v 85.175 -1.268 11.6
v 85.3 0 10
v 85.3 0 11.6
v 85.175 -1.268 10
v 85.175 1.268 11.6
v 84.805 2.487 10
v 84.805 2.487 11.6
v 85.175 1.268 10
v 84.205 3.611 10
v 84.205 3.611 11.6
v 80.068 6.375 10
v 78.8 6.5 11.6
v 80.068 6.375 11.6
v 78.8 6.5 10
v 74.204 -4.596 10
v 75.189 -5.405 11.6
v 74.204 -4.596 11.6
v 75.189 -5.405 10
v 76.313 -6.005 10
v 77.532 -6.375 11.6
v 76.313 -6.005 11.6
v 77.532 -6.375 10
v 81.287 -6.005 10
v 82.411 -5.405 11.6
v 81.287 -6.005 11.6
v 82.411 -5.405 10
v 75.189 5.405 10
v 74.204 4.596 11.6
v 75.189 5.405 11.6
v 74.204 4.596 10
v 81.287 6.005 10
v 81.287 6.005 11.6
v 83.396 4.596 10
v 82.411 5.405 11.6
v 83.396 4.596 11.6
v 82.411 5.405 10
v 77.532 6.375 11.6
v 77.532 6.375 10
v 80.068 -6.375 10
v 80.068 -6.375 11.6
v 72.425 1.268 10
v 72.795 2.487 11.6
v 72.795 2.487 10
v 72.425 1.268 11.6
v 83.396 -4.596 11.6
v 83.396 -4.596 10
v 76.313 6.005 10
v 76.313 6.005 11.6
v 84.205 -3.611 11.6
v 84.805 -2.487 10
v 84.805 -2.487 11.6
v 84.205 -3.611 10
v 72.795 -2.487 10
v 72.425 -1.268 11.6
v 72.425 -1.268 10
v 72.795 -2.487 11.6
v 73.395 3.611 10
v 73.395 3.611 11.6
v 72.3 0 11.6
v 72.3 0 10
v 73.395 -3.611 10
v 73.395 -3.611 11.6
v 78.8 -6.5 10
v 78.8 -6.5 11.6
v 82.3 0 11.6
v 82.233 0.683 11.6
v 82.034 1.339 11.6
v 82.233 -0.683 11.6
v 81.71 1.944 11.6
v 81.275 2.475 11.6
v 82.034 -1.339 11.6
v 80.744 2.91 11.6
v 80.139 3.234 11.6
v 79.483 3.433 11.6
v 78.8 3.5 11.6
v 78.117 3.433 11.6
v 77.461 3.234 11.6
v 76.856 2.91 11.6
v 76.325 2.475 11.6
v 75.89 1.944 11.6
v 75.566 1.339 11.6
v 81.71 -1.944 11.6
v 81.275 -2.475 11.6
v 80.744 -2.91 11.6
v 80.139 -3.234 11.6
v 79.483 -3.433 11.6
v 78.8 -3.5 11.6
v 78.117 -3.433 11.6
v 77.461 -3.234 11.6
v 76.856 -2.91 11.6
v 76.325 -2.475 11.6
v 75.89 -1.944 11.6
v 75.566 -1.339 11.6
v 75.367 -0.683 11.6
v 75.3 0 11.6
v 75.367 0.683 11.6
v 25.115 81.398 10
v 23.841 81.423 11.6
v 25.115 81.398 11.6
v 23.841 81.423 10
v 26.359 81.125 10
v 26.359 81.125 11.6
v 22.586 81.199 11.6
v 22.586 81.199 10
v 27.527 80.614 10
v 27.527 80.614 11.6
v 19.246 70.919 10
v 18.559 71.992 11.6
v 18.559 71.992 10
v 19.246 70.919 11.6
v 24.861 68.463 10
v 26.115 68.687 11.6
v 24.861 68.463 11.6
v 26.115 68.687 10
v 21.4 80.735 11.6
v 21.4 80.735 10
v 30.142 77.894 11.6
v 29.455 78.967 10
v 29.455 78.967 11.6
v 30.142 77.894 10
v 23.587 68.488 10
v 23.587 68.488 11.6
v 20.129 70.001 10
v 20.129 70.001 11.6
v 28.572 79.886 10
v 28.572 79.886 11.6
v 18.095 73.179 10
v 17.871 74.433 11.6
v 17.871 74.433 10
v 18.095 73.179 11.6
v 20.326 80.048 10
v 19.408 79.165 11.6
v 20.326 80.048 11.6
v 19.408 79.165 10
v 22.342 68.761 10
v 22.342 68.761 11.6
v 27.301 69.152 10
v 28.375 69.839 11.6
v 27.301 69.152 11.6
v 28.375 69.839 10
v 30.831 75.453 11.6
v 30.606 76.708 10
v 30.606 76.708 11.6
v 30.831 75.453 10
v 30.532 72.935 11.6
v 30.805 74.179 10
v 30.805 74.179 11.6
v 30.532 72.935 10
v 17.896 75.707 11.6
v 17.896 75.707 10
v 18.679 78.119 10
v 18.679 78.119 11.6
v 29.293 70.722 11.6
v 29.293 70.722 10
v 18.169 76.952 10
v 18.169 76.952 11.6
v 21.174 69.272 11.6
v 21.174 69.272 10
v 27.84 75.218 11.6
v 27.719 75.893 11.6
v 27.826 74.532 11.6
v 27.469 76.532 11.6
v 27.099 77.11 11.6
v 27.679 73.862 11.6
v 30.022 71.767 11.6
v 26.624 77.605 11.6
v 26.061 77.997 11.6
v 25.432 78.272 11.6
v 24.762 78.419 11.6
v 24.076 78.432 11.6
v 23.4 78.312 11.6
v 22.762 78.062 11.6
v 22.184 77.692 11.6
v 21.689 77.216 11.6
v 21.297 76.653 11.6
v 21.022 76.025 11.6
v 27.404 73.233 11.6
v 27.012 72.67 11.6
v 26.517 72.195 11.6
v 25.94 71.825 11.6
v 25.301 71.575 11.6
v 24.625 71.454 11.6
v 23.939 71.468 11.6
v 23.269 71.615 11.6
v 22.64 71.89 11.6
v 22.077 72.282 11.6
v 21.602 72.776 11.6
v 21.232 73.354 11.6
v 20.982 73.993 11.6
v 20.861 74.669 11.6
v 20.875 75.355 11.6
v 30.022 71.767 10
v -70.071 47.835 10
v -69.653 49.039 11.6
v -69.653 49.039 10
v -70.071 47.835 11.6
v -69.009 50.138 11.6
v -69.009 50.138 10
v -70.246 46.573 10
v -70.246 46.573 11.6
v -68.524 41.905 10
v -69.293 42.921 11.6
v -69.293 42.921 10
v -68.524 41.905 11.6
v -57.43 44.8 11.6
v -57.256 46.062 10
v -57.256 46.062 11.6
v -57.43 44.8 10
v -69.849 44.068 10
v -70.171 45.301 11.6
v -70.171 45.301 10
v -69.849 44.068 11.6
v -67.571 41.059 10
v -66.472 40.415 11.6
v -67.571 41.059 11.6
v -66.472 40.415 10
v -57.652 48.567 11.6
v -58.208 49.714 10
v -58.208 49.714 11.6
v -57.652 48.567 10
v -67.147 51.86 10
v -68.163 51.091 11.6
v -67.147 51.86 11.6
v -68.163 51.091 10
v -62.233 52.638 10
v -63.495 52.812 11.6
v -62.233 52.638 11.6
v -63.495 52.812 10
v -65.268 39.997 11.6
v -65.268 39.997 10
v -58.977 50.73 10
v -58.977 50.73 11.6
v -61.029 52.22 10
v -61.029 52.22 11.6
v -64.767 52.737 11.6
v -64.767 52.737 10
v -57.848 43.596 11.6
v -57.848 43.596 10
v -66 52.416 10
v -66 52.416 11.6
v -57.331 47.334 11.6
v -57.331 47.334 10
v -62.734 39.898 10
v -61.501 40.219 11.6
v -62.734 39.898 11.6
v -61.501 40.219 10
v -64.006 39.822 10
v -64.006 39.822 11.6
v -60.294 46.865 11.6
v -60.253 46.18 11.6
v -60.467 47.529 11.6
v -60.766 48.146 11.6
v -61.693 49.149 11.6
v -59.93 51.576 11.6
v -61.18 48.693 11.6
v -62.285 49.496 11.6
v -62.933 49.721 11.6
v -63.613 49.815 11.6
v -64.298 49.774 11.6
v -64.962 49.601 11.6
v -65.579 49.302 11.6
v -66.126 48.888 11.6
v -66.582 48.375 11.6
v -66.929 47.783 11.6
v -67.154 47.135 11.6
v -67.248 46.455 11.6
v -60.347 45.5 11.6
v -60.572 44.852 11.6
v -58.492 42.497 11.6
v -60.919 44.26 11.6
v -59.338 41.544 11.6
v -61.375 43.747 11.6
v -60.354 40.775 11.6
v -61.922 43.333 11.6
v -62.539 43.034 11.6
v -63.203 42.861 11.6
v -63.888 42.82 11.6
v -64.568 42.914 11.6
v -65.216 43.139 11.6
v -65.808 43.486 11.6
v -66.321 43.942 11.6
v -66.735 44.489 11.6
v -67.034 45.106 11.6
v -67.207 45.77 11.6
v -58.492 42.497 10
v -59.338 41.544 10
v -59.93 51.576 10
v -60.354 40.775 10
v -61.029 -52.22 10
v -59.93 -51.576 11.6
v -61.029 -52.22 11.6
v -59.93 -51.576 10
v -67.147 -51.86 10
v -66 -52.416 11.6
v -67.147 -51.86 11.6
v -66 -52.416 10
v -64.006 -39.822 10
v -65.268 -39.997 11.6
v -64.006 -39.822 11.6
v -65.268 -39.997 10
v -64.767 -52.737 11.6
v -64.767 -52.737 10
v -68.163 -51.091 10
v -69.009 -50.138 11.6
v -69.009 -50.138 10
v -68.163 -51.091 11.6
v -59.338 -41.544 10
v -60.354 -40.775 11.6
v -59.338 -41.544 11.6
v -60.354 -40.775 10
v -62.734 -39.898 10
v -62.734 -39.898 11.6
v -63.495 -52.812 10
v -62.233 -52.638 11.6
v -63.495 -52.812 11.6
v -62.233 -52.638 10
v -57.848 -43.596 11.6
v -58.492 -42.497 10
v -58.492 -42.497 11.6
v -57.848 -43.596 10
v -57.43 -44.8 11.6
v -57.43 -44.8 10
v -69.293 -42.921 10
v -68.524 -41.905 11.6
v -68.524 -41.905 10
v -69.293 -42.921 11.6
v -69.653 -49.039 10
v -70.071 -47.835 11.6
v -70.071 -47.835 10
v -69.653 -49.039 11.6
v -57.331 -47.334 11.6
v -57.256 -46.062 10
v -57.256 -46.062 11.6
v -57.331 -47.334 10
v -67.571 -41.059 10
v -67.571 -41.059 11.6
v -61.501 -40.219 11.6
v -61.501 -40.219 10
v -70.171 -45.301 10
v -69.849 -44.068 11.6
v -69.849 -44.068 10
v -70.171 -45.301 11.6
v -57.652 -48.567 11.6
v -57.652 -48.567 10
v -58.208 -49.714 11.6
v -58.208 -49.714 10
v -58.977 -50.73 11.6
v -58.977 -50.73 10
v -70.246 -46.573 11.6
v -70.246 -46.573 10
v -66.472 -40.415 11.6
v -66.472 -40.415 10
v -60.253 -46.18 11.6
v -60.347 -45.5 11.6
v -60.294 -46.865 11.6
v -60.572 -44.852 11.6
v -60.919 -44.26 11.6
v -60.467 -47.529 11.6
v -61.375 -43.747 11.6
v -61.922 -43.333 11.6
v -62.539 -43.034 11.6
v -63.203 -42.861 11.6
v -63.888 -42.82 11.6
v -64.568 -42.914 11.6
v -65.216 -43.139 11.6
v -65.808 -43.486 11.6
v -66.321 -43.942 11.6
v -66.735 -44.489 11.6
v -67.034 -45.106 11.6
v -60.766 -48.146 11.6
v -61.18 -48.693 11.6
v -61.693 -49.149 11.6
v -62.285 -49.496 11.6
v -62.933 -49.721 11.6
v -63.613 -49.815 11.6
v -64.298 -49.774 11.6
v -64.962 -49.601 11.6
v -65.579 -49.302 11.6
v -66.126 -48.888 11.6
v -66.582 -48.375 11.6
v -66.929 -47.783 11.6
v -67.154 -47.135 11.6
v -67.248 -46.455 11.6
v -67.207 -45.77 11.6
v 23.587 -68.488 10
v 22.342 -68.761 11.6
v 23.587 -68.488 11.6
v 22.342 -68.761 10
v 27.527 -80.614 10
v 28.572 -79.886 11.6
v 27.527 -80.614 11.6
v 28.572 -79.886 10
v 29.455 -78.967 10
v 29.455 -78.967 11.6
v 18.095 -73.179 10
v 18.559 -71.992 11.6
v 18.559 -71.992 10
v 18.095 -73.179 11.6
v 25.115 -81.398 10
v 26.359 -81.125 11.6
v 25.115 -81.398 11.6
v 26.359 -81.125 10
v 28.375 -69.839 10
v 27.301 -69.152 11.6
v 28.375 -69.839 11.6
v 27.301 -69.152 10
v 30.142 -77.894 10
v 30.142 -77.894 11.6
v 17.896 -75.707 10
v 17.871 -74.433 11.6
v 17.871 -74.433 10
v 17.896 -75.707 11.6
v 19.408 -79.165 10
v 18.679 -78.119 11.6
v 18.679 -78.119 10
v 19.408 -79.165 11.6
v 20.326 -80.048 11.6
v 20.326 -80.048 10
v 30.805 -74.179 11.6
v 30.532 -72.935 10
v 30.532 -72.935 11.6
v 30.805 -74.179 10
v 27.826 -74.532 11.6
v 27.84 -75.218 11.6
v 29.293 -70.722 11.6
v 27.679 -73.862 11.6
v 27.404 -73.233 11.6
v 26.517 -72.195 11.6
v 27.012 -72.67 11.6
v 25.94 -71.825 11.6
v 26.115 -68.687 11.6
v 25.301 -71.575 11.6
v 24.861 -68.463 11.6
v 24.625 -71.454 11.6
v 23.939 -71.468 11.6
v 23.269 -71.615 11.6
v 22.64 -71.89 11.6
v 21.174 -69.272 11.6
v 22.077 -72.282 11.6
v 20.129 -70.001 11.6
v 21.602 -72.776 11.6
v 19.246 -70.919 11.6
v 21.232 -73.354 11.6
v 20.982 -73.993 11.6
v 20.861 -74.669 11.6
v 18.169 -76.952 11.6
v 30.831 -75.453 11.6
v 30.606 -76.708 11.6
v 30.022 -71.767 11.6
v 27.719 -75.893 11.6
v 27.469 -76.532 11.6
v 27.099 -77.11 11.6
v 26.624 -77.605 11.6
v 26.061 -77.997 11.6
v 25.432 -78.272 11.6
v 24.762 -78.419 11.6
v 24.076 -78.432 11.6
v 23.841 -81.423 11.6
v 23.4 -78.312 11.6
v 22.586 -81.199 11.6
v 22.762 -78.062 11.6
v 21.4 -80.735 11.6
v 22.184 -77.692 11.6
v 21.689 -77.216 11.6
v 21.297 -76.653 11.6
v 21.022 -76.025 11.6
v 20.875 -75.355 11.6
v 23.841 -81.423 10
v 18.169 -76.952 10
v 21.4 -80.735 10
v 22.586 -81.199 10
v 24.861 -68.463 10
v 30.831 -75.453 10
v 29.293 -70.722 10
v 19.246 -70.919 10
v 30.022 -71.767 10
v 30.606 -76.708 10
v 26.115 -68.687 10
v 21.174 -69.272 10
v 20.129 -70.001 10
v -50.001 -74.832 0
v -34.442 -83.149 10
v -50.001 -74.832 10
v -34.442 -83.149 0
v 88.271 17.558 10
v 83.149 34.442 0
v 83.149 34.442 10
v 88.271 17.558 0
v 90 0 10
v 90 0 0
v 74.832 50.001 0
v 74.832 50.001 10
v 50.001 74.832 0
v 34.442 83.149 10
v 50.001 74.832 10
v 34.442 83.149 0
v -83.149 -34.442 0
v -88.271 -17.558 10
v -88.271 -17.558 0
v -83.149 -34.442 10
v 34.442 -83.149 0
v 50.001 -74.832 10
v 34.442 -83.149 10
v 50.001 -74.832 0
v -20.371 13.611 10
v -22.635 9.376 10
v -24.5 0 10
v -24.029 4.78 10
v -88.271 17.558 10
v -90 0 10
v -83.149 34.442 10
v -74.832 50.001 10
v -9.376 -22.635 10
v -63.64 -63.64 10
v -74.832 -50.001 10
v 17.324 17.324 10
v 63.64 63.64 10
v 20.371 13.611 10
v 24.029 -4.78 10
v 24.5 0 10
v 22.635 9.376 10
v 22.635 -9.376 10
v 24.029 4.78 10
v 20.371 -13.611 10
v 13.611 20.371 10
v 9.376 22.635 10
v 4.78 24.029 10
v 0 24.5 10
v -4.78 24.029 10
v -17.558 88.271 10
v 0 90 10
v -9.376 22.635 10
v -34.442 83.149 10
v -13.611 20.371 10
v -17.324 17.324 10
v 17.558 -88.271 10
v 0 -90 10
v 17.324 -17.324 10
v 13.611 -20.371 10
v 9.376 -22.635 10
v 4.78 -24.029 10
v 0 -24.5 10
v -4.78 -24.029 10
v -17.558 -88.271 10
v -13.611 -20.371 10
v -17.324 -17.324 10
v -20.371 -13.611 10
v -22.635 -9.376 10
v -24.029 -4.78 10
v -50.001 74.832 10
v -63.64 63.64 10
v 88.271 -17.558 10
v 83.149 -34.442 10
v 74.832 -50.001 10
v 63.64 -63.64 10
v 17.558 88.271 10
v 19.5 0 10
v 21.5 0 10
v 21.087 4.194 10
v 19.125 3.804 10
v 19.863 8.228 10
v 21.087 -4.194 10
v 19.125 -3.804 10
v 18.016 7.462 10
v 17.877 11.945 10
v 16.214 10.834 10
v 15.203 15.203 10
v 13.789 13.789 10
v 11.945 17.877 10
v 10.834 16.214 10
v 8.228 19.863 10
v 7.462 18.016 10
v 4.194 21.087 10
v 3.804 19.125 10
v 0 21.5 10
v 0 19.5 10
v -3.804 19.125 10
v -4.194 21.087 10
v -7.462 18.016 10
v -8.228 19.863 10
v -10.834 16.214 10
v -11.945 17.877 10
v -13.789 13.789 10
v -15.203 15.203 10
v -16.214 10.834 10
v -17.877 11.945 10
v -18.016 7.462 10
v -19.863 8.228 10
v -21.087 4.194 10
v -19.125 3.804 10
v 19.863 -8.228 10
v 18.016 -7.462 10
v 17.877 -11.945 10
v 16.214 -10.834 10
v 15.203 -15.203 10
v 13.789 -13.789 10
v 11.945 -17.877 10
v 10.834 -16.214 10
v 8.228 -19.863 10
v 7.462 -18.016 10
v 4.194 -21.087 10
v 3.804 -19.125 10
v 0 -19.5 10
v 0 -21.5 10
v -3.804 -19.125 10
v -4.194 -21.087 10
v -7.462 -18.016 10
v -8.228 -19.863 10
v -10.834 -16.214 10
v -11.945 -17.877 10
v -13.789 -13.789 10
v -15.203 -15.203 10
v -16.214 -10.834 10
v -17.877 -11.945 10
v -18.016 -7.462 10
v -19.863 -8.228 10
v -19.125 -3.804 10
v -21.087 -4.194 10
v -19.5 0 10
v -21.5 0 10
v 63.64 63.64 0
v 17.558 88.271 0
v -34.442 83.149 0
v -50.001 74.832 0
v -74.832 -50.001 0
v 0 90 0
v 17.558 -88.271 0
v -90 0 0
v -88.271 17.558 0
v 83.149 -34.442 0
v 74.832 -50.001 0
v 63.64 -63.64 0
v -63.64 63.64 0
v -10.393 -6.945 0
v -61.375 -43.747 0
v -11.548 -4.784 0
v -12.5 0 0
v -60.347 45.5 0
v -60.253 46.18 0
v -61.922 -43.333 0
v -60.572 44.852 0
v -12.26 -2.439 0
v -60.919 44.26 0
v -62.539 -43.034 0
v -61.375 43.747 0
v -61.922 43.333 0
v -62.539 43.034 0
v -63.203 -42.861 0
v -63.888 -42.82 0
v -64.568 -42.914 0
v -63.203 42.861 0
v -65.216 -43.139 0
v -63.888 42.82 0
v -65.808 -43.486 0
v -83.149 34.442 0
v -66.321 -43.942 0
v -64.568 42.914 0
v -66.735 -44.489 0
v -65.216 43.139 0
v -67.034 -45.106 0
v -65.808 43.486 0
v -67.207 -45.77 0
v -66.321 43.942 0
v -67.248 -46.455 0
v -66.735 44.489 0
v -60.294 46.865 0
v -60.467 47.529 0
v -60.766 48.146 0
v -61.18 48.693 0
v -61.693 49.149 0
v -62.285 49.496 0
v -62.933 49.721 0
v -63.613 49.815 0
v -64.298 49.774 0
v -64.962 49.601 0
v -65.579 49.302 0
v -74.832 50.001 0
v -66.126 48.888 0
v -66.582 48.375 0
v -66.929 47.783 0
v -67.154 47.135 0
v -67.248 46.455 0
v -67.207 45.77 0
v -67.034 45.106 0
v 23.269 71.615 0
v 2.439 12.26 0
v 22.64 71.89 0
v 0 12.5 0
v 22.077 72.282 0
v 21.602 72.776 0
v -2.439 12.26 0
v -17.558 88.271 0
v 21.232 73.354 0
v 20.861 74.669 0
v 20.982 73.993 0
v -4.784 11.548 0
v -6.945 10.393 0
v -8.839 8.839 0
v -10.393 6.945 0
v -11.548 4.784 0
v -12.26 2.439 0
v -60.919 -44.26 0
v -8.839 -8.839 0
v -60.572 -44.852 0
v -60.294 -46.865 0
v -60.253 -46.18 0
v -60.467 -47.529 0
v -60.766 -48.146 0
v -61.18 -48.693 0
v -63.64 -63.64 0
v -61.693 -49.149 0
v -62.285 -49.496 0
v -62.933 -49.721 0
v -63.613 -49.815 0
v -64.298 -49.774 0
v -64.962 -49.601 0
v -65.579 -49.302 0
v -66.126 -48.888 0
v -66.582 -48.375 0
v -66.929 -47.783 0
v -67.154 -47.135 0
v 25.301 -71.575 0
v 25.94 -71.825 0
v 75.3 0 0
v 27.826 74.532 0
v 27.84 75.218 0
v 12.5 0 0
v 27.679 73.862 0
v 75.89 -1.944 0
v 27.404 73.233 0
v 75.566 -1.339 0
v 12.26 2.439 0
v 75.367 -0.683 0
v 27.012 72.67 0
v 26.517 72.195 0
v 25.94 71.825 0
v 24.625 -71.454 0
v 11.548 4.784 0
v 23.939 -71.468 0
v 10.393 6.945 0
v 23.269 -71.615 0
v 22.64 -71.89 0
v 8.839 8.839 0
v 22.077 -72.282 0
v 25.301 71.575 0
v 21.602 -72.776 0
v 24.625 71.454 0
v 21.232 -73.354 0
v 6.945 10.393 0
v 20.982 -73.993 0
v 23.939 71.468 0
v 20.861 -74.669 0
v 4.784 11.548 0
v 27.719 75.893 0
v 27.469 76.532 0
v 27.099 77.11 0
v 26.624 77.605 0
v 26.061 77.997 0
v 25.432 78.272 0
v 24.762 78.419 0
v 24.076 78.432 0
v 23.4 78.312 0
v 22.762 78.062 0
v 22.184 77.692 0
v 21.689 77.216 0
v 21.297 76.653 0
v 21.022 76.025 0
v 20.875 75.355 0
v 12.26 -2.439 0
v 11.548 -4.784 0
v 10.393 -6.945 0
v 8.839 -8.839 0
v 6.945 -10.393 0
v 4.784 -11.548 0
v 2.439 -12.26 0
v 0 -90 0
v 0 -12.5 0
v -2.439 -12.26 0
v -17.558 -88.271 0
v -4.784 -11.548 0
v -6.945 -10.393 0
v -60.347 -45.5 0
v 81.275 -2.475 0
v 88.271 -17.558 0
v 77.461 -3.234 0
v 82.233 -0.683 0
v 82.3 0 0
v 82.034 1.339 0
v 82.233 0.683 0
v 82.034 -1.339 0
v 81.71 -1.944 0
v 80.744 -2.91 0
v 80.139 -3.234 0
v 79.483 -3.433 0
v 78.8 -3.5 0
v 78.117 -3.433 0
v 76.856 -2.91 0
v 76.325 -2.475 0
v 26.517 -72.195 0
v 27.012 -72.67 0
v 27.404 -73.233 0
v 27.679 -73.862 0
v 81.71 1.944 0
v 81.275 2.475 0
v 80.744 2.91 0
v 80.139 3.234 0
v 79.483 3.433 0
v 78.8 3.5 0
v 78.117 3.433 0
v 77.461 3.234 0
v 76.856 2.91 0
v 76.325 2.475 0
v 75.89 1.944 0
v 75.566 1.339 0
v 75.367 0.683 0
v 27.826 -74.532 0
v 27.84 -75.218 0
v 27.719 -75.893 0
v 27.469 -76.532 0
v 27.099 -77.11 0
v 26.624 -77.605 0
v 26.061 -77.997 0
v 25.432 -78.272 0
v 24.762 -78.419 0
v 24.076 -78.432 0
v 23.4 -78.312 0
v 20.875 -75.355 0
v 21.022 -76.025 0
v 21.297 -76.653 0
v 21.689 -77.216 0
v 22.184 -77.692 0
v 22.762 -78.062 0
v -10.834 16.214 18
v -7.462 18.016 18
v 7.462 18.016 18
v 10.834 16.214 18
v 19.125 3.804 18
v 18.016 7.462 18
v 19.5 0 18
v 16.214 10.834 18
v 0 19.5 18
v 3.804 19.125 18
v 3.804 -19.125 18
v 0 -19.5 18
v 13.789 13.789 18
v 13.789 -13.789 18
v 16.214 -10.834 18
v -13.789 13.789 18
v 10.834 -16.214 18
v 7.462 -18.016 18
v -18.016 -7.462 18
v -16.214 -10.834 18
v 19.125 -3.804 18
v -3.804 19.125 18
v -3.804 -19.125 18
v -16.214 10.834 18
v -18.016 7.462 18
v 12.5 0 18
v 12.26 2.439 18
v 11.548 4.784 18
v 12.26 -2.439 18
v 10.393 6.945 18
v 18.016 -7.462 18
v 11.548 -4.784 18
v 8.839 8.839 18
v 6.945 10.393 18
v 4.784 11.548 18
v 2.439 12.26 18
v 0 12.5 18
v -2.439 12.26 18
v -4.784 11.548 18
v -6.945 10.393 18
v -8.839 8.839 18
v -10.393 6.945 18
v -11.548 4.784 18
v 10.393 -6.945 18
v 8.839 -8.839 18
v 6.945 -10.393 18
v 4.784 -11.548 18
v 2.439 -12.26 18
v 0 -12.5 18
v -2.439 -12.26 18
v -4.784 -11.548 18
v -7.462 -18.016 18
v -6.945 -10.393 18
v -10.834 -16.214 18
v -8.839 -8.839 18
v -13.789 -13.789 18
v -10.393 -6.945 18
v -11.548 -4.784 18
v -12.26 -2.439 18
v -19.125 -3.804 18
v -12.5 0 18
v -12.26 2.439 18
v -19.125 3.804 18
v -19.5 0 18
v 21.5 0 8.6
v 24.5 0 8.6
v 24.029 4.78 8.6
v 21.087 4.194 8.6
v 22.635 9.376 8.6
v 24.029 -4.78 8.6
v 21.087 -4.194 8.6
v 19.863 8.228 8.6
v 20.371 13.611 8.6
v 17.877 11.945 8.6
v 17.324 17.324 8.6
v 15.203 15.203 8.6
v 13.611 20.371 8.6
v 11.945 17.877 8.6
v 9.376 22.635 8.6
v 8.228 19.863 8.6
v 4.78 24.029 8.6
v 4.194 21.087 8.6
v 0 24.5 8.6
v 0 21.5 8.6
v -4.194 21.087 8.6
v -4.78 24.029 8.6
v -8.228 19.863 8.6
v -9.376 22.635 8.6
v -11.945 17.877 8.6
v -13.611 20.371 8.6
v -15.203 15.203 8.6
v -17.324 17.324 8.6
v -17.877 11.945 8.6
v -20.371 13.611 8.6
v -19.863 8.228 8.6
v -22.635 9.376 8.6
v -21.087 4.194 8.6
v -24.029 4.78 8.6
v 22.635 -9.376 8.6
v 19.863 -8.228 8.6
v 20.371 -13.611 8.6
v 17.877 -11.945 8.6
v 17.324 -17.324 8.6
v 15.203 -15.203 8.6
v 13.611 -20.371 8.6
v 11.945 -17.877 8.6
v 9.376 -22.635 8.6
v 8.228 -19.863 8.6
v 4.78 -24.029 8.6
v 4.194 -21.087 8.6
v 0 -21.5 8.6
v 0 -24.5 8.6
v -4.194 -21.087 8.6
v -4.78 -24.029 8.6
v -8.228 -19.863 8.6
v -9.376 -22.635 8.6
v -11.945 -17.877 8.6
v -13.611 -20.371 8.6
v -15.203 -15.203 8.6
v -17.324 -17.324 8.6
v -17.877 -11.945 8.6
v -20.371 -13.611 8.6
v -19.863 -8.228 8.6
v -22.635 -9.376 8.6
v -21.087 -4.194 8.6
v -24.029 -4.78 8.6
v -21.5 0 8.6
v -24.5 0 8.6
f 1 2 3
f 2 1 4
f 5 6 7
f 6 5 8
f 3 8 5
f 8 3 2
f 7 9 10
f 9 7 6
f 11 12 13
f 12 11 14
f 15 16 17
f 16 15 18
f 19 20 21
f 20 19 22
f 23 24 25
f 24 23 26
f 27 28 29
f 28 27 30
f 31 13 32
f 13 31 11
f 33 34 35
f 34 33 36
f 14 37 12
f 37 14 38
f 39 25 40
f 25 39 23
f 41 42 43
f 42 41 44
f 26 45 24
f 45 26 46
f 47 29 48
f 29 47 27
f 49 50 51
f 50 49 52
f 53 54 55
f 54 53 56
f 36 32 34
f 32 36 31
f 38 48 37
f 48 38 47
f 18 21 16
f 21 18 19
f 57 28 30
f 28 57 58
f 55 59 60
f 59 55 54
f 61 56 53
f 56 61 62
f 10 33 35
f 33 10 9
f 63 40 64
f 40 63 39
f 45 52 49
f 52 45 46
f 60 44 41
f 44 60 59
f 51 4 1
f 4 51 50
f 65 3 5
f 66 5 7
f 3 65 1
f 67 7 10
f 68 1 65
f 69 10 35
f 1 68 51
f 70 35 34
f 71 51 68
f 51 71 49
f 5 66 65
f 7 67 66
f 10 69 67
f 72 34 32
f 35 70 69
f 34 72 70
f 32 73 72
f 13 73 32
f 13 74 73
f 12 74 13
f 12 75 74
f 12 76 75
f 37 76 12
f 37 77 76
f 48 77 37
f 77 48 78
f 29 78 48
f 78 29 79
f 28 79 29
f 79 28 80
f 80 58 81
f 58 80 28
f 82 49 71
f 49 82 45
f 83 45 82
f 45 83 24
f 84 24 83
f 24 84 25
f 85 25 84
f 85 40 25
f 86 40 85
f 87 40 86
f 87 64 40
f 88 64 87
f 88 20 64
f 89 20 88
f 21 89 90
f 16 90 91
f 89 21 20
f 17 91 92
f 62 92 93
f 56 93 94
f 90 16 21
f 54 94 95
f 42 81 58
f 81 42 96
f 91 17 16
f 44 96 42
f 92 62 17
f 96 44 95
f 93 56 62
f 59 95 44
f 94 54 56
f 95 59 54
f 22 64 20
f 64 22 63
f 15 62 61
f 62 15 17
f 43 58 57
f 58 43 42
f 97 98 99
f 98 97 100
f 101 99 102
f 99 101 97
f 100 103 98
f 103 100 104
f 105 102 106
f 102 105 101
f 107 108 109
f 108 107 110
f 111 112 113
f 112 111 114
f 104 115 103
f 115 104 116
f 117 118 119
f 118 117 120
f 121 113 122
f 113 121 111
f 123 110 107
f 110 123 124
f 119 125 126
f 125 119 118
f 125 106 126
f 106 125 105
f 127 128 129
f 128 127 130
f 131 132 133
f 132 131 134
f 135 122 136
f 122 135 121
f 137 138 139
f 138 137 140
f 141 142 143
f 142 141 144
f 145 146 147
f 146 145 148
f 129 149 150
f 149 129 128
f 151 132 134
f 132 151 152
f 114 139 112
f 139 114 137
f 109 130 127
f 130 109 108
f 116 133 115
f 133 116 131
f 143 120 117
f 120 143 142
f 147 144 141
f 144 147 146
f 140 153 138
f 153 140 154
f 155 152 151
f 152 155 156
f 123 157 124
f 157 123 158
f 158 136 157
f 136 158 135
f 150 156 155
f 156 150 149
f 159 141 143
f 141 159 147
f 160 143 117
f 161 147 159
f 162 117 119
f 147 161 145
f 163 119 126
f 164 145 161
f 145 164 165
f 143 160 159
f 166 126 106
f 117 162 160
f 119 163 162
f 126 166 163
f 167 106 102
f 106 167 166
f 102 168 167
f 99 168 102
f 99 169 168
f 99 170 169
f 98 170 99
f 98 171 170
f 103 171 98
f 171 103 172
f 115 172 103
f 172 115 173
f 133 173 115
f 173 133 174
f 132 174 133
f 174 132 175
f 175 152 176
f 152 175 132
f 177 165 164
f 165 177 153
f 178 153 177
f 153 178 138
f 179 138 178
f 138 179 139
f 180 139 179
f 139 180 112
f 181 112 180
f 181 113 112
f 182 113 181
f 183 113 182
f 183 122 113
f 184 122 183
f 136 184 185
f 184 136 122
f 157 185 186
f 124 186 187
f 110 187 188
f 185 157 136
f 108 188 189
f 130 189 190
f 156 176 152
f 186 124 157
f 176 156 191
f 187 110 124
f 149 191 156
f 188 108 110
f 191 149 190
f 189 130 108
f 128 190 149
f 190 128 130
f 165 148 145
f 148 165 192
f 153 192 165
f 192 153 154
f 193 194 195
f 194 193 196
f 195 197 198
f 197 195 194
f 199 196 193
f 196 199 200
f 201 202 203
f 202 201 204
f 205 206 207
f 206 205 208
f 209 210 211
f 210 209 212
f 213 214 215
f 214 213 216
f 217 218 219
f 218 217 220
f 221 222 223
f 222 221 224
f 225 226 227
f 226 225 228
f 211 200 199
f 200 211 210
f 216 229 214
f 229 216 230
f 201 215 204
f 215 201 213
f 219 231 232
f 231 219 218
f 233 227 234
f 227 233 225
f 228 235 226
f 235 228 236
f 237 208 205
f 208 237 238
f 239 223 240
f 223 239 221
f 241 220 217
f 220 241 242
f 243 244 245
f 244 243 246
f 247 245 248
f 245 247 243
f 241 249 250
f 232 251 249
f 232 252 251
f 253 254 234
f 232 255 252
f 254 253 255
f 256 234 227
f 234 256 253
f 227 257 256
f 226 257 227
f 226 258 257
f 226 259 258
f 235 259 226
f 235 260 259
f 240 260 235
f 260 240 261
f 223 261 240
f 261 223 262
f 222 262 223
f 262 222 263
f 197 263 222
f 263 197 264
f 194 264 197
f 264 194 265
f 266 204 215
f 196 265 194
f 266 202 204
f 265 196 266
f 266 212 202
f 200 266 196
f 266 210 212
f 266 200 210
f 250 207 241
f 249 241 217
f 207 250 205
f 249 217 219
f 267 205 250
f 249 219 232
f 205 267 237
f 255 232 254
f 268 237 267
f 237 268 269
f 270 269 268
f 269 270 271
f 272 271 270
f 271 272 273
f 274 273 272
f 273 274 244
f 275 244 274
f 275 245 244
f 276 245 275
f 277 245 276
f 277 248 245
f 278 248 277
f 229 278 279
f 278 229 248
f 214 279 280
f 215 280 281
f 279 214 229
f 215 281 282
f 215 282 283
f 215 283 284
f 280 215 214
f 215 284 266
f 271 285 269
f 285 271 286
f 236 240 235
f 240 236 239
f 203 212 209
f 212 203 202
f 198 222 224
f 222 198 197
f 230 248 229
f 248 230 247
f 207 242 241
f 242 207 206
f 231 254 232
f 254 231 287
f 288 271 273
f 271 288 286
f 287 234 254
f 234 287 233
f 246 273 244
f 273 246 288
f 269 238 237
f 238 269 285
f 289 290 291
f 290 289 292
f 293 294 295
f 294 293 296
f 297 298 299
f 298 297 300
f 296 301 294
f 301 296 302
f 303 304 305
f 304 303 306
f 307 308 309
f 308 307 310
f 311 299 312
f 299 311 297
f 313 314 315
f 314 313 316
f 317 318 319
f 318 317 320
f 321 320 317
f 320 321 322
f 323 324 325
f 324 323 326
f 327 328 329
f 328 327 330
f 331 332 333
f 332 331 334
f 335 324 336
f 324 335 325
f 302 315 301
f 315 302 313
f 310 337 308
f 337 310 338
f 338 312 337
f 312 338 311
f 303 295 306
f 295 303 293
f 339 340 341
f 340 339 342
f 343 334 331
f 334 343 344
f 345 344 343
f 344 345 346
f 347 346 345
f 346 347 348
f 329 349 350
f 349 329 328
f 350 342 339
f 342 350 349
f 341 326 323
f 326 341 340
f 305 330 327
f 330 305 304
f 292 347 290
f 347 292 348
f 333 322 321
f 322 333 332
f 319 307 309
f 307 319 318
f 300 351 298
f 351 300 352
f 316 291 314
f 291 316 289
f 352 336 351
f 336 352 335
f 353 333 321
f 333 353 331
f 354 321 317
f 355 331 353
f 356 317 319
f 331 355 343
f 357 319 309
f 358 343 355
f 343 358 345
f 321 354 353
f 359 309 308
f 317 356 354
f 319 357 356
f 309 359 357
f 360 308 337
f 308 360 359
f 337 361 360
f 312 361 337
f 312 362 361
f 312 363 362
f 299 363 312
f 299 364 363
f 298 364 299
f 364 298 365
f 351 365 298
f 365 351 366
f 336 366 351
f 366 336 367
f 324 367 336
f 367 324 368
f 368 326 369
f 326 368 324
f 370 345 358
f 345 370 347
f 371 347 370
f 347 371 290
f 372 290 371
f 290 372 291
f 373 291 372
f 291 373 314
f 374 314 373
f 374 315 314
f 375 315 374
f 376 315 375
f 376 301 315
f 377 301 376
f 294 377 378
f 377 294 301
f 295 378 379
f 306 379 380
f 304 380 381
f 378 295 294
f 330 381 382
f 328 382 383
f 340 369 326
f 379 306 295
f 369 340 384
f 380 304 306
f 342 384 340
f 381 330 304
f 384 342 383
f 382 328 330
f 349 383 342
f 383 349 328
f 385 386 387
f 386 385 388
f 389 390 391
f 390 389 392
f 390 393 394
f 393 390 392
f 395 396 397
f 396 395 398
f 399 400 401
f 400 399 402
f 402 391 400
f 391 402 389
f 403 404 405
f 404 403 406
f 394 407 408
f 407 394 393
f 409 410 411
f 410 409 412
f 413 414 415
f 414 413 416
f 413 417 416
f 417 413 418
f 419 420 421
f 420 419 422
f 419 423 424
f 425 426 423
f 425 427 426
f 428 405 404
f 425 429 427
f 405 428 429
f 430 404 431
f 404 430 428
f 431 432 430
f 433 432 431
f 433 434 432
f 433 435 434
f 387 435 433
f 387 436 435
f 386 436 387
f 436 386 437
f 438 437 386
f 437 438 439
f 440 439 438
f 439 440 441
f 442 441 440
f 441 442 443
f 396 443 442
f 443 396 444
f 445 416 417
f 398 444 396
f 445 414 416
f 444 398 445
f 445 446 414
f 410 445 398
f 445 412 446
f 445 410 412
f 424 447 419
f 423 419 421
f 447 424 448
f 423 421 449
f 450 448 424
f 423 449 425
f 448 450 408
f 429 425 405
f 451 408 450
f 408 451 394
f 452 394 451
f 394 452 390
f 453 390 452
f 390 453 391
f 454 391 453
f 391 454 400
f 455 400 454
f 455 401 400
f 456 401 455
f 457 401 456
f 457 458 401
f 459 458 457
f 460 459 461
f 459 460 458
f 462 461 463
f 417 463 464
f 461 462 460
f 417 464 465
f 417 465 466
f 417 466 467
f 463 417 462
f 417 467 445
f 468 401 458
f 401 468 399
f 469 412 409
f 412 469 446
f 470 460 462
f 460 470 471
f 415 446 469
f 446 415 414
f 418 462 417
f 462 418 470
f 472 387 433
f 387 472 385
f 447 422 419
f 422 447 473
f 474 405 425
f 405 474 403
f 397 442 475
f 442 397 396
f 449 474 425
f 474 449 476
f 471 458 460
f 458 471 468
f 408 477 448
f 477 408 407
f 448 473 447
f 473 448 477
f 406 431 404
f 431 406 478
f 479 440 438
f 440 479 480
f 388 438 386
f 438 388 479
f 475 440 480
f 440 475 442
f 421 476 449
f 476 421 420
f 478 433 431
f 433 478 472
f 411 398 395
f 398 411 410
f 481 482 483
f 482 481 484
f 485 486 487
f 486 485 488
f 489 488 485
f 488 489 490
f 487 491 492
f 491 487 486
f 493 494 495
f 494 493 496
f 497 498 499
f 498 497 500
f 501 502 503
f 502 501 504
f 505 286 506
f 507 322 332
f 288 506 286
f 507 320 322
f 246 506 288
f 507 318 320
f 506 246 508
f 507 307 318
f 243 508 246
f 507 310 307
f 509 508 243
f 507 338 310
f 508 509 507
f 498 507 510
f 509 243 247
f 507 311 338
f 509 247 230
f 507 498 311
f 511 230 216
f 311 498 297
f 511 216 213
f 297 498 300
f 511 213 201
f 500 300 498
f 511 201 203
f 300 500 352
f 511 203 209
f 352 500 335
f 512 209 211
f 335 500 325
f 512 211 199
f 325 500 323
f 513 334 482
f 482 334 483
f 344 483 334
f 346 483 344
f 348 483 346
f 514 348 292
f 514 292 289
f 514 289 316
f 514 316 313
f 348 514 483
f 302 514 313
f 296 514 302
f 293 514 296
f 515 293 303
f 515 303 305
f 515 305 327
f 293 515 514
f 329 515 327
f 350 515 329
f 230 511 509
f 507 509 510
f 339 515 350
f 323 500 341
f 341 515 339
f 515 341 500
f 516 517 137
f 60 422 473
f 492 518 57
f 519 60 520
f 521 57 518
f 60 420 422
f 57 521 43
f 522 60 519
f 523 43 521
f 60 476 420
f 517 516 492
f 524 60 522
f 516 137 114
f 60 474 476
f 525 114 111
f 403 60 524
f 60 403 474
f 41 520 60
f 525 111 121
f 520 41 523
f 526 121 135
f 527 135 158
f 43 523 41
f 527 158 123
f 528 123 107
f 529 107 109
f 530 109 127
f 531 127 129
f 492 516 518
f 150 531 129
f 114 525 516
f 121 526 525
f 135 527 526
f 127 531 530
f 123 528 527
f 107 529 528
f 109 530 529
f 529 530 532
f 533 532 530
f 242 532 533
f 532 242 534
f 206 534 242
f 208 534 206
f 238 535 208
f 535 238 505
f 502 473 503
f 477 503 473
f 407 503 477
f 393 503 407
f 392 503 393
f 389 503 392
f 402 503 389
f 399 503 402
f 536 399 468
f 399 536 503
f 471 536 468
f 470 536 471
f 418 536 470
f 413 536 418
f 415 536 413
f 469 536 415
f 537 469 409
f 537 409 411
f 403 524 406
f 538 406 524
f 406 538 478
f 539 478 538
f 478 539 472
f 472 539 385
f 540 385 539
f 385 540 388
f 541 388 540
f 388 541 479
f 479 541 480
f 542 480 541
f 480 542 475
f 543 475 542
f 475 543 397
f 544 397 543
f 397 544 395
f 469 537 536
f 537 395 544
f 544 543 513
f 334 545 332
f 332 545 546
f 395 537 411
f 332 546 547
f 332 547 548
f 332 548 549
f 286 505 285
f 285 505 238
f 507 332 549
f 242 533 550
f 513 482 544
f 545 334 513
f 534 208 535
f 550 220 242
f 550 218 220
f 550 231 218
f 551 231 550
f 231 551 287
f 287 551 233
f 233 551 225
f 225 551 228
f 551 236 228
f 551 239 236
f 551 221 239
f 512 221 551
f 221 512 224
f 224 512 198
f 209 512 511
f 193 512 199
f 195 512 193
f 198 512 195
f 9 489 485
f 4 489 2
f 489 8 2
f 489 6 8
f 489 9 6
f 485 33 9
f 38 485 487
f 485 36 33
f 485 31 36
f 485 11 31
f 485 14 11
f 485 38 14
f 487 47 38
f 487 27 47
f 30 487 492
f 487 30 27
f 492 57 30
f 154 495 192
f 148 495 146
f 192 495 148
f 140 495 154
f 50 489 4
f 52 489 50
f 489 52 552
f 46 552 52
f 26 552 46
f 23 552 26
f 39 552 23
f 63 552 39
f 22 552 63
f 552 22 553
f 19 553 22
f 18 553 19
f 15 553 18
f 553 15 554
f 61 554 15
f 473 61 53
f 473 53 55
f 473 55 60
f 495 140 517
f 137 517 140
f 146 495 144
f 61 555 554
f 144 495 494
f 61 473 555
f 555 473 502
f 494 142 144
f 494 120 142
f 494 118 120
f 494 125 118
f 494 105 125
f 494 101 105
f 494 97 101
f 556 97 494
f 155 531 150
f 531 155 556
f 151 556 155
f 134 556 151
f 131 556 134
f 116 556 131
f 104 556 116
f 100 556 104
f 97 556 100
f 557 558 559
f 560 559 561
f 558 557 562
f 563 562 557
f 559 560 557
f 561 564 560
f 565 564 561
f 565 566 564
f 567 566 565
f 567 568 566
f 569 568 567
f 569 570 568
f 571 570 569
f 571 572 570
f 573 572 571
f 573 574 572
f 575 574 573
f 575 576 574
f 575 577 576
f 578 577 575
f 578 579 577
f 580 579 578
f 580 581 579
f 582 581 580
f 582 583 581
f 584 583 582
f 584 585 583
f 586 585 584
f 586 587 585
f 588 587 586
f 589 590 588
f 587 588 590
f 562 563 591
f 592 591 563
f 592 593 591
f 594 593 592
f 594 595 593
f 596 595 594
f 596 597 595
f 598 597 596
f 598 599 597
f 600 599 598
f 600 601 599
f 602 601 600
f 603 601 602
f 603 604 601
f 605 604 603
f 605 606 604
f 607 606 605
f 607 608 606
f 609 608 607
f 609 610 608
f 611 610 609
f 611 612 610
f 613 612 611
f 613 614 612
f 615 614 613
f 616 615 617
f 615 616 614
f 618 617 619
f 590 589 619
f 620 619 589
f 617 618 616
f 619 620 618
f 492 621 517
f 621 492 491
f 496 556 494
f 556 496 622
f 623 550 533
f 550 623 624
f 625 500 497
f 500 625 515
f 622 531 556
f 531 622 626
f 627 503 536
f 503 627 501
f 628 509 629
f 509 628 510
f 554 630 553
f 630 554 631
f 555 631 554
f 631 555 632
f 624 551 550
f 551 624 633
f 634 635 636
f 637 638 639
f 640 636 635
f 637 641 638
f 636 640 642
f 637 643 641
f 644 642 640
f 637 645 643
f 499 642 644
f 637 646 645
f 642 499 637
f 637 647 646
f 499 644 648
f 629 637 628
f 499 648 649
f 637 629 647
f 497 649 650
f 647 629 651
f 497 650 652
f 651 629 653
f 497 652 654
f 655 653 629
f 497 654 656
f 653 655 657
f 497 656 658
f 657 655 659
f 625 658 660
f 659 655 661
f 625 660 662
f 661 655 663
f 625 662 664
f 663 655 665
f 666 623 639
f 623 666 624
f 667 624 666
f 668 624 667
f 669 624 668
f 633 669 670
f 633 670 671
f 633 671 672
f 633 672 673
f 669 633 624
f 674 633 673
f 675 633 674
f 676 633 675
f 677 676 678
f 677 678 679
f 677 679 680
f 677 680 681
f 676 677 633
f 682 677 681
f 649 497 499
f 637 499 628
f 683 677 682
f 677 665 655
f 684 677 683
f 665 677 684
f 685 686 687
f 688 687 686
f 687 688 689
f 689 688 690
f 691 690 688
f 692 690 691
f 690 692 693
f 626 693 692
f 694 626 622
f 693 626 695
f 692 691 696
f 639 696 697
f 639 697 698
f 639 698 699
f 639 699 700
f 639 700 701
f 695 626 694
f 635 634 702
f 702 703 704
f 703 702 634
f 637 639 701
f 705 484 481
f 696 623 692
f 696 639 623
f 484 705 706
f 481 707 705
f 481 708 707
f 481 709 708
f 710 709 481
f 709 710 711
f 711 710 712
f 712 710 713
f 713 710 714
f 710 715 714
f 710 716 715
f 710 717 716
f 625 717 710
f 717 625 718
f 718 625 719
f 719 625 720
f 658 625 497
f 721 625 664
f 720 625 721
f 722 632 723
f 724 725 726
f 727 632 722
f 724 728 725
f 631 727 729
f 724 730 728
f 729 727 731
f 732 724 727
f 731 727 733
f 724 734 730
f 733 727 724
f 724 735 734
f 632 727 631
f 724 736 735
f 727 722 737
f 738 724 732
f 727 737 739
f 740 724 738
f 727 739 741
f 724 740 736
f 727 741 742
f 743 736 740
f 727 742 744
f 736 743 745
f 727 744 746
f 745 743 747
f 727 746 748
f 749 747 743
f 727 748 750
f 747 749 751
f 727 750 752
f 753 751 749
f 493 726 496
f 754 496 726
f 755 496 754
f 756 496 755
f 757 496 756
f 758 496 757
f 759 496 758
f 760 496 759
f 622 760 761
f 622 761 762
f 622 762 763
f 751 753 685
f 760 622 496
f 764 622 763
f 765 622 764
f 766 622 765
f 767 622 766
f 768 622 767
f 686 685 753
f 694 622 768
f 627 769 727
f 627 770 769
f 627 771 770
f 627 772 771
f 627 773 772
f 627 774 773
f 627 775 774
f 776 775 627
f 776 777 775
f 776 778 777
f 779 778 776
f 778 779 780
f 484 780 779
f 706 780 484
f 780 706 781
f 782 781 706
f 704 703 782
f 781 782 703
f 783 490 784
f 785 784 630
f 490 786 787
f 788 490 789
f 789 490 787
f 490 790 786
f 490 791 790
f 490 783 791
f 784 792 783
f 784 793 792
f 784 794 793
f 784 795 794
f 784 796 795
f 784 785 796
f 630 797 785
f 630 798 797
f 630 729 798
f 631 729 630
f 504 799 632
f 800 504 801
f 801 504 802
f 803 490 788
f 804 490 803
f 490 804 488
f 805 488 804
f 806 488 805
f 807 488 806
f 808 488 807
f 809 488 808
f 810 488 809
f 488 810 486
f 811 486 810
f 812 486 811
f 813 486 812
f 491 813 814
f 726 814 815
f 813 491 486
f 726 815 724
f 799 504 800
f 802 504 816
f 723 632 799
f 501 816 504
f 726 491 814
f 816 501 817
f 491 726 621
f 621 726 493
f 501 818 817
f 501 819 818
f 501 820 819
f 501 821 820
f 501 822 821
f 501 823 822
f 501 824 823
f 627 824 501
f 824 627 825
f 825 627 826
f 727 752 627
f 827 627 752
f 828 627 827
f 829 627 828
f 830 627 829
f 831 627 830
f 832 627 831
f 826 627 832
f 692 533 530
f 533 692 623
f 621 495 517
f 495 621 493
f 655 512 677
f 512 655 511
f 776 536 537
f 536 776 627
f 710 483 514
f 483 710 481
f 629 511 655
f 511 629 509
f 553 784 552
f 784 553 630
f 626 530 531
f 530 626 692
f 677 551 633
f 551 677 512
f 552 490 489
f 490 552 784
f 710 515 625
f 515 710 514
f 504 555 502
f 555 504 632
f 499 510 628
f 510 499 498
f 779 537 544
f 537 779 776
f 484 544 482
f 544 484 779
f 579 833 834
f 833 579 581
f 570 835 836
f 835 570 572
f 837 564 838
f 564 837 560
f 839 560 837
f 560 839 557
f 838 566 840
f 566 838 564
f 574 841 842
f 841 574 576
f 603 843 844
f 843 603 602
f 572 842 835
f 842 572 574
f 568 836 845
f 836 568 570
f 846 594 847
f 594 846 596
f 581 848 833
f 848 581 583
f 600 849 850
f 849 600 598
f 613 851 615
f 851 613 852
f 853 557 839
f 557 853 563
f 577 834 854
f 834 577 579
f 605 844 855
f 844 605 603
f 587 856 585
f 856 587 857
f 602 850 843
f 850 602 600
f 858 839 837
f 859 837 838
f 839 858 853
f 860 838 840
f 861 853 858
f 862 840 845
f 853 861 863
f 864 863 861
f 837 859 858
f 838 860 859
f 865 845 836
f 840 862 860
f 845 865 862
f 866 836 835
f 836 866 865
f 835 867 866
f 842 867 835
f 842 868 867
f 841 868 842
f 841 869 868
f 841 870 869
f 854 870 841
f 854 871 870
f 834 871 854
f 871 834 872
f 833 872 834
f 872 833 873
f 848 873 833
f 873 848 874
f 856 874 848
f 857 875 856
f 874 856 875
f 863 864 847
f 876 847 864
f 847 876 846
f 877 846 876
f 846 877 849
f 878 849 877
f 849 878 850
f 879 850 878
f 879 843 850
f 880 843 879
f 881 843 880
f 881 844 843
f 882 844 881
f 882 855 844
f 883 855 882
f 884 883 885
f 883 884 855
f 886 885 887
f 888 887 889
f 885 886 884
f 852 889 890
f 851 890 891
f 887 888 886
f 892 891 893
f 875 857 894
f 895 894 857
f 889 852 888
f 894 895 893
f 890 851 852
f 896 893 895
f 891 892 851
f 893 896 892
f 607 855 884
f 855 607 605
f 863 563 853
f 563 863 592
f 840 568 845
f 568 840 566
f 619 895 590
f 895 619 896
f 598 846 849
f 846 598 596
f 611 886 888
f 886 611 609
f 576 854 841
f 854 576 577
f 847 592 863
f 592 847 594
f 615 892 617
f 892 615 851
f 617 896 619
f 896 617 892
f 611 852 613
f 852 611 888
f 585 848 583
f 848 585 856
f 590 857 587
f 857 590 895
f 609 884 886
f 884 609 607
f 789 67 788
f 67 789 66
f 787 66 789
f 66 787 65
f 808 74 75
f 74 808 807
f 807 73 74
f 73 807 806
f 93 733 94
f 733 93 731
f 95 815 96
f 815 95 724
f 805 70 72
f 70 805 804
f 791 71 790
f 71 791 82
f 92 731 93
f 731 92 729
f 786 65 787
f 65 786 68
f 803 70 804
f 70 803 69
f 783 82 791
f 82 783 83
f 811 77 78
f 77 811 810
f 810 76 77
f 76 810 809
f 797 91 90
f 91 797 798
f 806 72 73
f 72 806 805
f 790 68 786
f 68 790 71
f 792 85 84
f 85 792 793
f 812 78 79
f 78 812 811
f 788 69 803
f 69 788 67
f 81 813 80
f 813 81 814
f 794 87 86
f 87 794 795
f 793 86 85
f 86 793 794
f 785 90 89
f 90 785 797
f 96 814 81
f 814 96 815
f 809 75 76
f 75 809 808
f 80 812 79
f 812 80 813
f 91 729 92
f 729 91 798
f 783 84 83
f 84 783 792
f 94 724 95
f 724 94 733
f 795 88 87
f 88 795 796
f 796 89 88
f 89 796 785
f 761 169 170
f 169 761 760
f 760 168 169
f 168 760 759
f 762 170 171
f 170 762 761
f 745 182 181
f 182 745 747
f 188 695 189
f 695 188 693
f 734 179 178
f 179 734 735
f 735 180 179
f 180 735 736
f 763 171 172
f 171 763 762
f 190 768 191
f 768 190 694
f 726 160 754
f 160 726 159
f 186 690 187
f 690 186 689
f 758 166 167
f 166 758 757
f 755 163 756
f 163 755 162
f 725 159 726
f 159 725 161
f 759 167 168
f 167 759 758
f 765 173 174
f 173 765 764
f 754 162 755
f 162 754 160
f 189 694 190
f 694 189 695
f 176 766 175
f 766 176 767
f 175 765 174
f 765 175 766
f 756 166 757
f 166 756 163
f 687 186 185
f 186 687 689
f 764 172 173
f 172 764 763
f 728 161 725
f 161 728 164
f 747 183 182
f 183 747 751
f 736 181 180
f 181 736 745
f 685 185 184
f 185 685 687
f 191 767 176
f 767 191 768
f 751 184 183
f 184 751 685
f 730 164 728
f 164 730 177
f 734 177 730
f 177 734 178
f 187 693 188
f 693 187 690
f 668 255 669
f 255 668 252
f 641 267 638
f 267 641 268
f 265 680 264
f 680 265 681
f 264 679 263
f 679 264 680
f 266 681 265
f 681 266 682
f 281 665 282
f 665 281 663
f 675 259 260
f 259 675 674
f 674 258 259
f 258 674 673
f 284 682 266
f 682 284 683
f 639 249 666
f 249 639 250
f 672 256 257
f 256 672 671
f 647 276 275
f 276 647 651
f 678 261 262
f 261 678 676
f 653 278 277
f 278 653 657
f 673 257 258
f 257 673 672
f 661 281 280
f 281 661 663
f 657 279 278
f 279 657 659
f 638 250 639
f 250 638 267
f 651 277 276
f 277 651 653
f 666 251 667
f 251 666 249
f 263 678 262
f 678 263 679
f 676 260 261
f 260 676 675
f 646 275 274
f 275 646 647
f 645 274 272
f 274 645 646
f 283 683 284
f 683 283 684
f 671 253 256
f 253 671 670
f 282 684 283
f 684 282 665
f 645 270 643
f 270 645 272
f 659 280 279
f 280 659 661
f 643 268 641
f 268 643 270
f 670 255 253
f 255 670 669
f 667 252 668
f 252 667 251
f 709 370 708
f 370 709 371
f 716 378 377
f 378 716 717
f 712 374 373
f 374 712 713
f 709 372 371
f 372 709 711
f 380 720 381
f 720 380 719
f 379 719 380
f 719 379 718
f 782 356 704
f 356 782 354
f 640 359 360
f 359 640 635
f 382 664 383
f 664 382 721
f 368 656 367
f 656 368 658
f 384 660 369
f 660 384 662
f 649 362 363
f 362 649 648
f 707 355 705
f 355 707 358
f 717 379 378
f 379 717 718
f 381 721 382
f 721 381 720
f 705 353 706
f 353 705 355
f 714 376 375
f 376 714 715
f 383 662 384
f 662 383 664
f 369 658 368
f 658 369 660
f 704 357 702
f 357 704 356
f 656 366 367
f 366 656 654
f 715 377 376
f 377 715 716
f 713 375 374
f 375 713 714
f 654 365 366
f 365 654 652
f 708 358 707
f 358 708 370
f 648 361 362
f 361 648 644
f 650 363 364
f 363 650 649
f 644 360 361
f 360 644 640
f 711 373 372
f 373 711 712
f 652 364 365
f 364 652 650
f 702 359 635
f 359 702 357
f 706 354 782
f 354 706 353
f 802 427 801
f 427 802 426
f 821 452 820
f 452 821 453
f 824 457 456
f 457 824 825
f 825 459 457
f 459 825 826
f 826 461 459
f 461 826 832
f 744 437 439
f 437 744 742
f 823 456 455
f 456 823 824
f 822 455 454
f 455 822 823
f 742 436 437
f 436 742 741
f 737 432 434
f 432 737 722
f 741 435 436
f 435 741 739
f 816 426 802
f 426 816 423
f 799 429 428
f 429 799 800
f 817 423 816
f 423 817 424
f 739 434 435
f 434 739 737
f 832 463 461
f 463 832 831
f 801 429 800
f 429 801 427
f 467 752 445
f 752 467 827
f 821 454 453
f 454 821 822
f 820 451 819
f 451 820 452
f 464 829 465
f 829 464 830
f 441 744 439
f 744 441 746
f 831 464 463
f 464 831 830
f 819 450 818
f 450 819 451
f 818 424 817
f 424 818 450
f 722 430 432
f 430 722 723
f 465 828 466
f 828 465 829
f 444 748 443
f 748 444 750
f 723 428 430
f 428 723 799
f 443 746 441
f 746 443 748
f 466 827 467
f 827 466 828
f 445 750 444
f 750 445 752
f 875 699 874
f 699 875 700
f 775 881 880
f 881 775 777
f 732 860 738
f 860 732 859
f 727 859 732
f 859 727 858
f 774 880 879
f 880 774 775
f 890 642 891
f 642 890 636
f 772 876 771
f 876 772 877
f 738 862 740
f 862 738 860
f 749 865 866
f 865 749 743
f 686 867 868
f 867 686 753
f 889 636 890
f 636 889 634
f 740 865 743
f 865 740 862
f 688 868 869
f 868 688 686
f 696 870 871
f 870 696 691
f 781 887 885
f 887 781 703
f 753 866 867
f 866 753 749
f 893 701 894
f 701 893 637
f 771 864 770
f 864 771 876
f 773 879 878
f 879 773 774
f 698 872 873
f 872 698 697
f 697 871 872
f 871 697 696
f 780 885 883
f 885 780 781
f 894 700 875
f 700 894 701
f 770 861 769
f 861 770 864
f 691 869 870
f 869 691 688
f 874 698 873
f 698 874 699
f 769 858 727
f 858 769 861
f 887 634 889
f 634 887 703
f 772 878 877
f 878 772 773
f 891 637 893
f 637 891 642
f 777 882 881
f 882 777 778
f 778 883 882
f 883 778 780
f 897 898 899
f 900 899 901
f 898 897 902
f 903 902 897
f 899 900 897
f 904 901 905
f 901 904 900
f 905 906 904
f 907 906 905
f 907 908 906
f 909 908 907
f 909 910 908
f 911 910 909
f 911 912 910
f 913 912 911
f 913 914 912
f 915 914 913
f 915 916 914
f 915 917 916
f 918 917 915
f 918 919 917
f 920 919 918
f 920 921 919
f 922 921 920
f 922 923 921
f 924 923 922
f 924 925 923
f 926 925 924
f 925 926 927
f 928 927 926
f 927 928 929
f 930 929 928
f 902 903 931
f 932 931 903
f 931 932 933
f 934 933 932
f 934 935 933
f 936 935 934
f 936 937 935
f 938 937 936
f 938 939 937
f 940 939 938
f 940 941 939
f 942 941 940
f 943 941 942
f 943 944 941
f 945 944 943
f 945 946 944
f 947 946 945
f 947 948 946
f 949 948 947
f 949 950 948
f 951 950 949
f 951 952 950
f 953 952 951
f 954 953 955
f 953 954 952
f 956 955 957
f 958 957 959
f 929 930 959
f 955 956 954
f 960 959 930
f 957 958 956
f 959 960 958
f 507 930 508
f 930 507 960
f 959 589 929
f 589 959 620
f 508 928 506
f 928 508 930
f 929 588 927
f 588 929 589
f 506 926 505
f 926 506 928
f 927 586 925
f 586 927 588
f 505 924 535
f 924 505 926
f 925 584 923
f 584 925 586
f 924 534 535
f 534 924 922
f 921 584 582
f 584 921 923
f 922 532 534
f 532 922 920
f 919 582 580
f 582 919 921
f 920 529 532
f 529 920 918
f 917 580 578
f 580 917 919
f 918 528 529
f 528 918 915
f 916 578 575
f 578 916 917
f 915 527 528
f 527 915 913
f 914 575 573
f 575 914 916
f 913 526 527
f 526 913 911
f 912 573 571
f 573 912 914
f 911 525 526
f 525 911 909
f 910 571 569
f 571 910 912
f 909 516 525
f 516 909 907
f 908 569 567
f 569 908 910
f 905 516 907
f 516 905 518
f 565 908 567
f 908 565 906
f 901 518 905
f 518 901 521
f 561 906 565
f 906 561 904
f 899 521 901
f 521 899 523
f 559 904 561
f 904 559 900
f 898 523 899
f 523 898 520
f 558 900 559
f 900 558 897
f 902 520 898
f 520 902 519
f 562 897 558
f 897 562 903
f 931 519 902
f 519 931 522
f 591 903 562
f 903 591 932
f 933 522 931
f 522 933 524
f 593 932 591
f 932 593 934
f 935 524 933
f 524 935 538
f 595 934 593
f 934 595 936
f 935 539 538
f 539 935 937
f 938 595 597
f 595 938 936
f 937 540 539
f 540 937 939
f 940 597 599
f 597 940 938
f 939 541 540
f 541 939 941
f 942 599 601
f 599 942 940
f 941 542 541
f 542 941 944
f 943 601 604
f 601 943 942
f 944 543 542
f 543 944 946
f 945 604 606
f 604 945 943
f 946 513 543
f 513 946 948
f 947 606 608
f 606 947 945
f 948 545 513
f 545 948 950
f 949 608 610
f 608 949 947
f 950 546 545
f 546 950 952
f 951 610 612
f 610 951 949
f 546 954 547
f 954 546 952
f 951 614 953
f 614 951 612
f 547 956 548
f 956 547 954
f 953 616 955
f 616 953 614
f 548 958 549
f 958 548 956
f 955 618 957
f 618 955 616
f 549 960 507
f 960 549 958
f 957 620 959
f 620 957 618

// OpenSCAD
$fn = 32;

// ----------------------------------------------------------------------
// Bolt-circle flange: 180 mm outside, 5 bolt holes, bore 25 mm
// ----------------------------------------------------------------------

// --- parameters (mm) ---
flange_d = 180;           // flange outside diameter
flange_t = 10;            // flange thickness
bolts = 5;                // number of bolt holes
bolt_d = 7;               // bolt clearance
bolt_r = 78.8;            // bolt circle radius
bore_d = 25;              // centre bore
hub_d = 39;               // raised hub diameter
hub_h = 8;                // raised hub height
spot_d = 13;              // spot faced bosses
spot_h = 1.6;             // spot face height
groove_w = 3;             // gasket groove width
groove_d = 1.4;           // gasket groove depth
groove_r = 21.5;          // groove radius
groove_z = 8.6;           // groove floor depth from the face

module body() {
  cylinder(h = flange_t, d = flange_d);
  /* raised hub, sunk 1 mm into the flange */
  translate([0, 0, flange_t - 1]) cylinder(h = hub_h + 1, d = hub_d);
  /* spot faced pads under the bolt heads */
  for (i = [0 : bolts - 1]) rotate([0, 0, i * 360 / bolts]) translate([bolt_r, 0, flange_t - 1]) cylinder(h = spot_h + 1, d = spot_d);
}

difference() {
  body();
  /* bolt circle */
  for (i = [0 : bolts - 1]) rotate([0, 0, i * 360 / bolts]) translate([bolt_r, 0, -1]) cylinder(h = flange_t + hub_h + 3, d = bolt_d);
  translate([0, 0, -1]) cylinder(h = flange_t + hub_h + 3, d = bore_d);
  /* gasket groove on the front face */
  rotate_extrude() translate([groove_r, groove_z]) square([groove_w, groove_d + 1]);
}
